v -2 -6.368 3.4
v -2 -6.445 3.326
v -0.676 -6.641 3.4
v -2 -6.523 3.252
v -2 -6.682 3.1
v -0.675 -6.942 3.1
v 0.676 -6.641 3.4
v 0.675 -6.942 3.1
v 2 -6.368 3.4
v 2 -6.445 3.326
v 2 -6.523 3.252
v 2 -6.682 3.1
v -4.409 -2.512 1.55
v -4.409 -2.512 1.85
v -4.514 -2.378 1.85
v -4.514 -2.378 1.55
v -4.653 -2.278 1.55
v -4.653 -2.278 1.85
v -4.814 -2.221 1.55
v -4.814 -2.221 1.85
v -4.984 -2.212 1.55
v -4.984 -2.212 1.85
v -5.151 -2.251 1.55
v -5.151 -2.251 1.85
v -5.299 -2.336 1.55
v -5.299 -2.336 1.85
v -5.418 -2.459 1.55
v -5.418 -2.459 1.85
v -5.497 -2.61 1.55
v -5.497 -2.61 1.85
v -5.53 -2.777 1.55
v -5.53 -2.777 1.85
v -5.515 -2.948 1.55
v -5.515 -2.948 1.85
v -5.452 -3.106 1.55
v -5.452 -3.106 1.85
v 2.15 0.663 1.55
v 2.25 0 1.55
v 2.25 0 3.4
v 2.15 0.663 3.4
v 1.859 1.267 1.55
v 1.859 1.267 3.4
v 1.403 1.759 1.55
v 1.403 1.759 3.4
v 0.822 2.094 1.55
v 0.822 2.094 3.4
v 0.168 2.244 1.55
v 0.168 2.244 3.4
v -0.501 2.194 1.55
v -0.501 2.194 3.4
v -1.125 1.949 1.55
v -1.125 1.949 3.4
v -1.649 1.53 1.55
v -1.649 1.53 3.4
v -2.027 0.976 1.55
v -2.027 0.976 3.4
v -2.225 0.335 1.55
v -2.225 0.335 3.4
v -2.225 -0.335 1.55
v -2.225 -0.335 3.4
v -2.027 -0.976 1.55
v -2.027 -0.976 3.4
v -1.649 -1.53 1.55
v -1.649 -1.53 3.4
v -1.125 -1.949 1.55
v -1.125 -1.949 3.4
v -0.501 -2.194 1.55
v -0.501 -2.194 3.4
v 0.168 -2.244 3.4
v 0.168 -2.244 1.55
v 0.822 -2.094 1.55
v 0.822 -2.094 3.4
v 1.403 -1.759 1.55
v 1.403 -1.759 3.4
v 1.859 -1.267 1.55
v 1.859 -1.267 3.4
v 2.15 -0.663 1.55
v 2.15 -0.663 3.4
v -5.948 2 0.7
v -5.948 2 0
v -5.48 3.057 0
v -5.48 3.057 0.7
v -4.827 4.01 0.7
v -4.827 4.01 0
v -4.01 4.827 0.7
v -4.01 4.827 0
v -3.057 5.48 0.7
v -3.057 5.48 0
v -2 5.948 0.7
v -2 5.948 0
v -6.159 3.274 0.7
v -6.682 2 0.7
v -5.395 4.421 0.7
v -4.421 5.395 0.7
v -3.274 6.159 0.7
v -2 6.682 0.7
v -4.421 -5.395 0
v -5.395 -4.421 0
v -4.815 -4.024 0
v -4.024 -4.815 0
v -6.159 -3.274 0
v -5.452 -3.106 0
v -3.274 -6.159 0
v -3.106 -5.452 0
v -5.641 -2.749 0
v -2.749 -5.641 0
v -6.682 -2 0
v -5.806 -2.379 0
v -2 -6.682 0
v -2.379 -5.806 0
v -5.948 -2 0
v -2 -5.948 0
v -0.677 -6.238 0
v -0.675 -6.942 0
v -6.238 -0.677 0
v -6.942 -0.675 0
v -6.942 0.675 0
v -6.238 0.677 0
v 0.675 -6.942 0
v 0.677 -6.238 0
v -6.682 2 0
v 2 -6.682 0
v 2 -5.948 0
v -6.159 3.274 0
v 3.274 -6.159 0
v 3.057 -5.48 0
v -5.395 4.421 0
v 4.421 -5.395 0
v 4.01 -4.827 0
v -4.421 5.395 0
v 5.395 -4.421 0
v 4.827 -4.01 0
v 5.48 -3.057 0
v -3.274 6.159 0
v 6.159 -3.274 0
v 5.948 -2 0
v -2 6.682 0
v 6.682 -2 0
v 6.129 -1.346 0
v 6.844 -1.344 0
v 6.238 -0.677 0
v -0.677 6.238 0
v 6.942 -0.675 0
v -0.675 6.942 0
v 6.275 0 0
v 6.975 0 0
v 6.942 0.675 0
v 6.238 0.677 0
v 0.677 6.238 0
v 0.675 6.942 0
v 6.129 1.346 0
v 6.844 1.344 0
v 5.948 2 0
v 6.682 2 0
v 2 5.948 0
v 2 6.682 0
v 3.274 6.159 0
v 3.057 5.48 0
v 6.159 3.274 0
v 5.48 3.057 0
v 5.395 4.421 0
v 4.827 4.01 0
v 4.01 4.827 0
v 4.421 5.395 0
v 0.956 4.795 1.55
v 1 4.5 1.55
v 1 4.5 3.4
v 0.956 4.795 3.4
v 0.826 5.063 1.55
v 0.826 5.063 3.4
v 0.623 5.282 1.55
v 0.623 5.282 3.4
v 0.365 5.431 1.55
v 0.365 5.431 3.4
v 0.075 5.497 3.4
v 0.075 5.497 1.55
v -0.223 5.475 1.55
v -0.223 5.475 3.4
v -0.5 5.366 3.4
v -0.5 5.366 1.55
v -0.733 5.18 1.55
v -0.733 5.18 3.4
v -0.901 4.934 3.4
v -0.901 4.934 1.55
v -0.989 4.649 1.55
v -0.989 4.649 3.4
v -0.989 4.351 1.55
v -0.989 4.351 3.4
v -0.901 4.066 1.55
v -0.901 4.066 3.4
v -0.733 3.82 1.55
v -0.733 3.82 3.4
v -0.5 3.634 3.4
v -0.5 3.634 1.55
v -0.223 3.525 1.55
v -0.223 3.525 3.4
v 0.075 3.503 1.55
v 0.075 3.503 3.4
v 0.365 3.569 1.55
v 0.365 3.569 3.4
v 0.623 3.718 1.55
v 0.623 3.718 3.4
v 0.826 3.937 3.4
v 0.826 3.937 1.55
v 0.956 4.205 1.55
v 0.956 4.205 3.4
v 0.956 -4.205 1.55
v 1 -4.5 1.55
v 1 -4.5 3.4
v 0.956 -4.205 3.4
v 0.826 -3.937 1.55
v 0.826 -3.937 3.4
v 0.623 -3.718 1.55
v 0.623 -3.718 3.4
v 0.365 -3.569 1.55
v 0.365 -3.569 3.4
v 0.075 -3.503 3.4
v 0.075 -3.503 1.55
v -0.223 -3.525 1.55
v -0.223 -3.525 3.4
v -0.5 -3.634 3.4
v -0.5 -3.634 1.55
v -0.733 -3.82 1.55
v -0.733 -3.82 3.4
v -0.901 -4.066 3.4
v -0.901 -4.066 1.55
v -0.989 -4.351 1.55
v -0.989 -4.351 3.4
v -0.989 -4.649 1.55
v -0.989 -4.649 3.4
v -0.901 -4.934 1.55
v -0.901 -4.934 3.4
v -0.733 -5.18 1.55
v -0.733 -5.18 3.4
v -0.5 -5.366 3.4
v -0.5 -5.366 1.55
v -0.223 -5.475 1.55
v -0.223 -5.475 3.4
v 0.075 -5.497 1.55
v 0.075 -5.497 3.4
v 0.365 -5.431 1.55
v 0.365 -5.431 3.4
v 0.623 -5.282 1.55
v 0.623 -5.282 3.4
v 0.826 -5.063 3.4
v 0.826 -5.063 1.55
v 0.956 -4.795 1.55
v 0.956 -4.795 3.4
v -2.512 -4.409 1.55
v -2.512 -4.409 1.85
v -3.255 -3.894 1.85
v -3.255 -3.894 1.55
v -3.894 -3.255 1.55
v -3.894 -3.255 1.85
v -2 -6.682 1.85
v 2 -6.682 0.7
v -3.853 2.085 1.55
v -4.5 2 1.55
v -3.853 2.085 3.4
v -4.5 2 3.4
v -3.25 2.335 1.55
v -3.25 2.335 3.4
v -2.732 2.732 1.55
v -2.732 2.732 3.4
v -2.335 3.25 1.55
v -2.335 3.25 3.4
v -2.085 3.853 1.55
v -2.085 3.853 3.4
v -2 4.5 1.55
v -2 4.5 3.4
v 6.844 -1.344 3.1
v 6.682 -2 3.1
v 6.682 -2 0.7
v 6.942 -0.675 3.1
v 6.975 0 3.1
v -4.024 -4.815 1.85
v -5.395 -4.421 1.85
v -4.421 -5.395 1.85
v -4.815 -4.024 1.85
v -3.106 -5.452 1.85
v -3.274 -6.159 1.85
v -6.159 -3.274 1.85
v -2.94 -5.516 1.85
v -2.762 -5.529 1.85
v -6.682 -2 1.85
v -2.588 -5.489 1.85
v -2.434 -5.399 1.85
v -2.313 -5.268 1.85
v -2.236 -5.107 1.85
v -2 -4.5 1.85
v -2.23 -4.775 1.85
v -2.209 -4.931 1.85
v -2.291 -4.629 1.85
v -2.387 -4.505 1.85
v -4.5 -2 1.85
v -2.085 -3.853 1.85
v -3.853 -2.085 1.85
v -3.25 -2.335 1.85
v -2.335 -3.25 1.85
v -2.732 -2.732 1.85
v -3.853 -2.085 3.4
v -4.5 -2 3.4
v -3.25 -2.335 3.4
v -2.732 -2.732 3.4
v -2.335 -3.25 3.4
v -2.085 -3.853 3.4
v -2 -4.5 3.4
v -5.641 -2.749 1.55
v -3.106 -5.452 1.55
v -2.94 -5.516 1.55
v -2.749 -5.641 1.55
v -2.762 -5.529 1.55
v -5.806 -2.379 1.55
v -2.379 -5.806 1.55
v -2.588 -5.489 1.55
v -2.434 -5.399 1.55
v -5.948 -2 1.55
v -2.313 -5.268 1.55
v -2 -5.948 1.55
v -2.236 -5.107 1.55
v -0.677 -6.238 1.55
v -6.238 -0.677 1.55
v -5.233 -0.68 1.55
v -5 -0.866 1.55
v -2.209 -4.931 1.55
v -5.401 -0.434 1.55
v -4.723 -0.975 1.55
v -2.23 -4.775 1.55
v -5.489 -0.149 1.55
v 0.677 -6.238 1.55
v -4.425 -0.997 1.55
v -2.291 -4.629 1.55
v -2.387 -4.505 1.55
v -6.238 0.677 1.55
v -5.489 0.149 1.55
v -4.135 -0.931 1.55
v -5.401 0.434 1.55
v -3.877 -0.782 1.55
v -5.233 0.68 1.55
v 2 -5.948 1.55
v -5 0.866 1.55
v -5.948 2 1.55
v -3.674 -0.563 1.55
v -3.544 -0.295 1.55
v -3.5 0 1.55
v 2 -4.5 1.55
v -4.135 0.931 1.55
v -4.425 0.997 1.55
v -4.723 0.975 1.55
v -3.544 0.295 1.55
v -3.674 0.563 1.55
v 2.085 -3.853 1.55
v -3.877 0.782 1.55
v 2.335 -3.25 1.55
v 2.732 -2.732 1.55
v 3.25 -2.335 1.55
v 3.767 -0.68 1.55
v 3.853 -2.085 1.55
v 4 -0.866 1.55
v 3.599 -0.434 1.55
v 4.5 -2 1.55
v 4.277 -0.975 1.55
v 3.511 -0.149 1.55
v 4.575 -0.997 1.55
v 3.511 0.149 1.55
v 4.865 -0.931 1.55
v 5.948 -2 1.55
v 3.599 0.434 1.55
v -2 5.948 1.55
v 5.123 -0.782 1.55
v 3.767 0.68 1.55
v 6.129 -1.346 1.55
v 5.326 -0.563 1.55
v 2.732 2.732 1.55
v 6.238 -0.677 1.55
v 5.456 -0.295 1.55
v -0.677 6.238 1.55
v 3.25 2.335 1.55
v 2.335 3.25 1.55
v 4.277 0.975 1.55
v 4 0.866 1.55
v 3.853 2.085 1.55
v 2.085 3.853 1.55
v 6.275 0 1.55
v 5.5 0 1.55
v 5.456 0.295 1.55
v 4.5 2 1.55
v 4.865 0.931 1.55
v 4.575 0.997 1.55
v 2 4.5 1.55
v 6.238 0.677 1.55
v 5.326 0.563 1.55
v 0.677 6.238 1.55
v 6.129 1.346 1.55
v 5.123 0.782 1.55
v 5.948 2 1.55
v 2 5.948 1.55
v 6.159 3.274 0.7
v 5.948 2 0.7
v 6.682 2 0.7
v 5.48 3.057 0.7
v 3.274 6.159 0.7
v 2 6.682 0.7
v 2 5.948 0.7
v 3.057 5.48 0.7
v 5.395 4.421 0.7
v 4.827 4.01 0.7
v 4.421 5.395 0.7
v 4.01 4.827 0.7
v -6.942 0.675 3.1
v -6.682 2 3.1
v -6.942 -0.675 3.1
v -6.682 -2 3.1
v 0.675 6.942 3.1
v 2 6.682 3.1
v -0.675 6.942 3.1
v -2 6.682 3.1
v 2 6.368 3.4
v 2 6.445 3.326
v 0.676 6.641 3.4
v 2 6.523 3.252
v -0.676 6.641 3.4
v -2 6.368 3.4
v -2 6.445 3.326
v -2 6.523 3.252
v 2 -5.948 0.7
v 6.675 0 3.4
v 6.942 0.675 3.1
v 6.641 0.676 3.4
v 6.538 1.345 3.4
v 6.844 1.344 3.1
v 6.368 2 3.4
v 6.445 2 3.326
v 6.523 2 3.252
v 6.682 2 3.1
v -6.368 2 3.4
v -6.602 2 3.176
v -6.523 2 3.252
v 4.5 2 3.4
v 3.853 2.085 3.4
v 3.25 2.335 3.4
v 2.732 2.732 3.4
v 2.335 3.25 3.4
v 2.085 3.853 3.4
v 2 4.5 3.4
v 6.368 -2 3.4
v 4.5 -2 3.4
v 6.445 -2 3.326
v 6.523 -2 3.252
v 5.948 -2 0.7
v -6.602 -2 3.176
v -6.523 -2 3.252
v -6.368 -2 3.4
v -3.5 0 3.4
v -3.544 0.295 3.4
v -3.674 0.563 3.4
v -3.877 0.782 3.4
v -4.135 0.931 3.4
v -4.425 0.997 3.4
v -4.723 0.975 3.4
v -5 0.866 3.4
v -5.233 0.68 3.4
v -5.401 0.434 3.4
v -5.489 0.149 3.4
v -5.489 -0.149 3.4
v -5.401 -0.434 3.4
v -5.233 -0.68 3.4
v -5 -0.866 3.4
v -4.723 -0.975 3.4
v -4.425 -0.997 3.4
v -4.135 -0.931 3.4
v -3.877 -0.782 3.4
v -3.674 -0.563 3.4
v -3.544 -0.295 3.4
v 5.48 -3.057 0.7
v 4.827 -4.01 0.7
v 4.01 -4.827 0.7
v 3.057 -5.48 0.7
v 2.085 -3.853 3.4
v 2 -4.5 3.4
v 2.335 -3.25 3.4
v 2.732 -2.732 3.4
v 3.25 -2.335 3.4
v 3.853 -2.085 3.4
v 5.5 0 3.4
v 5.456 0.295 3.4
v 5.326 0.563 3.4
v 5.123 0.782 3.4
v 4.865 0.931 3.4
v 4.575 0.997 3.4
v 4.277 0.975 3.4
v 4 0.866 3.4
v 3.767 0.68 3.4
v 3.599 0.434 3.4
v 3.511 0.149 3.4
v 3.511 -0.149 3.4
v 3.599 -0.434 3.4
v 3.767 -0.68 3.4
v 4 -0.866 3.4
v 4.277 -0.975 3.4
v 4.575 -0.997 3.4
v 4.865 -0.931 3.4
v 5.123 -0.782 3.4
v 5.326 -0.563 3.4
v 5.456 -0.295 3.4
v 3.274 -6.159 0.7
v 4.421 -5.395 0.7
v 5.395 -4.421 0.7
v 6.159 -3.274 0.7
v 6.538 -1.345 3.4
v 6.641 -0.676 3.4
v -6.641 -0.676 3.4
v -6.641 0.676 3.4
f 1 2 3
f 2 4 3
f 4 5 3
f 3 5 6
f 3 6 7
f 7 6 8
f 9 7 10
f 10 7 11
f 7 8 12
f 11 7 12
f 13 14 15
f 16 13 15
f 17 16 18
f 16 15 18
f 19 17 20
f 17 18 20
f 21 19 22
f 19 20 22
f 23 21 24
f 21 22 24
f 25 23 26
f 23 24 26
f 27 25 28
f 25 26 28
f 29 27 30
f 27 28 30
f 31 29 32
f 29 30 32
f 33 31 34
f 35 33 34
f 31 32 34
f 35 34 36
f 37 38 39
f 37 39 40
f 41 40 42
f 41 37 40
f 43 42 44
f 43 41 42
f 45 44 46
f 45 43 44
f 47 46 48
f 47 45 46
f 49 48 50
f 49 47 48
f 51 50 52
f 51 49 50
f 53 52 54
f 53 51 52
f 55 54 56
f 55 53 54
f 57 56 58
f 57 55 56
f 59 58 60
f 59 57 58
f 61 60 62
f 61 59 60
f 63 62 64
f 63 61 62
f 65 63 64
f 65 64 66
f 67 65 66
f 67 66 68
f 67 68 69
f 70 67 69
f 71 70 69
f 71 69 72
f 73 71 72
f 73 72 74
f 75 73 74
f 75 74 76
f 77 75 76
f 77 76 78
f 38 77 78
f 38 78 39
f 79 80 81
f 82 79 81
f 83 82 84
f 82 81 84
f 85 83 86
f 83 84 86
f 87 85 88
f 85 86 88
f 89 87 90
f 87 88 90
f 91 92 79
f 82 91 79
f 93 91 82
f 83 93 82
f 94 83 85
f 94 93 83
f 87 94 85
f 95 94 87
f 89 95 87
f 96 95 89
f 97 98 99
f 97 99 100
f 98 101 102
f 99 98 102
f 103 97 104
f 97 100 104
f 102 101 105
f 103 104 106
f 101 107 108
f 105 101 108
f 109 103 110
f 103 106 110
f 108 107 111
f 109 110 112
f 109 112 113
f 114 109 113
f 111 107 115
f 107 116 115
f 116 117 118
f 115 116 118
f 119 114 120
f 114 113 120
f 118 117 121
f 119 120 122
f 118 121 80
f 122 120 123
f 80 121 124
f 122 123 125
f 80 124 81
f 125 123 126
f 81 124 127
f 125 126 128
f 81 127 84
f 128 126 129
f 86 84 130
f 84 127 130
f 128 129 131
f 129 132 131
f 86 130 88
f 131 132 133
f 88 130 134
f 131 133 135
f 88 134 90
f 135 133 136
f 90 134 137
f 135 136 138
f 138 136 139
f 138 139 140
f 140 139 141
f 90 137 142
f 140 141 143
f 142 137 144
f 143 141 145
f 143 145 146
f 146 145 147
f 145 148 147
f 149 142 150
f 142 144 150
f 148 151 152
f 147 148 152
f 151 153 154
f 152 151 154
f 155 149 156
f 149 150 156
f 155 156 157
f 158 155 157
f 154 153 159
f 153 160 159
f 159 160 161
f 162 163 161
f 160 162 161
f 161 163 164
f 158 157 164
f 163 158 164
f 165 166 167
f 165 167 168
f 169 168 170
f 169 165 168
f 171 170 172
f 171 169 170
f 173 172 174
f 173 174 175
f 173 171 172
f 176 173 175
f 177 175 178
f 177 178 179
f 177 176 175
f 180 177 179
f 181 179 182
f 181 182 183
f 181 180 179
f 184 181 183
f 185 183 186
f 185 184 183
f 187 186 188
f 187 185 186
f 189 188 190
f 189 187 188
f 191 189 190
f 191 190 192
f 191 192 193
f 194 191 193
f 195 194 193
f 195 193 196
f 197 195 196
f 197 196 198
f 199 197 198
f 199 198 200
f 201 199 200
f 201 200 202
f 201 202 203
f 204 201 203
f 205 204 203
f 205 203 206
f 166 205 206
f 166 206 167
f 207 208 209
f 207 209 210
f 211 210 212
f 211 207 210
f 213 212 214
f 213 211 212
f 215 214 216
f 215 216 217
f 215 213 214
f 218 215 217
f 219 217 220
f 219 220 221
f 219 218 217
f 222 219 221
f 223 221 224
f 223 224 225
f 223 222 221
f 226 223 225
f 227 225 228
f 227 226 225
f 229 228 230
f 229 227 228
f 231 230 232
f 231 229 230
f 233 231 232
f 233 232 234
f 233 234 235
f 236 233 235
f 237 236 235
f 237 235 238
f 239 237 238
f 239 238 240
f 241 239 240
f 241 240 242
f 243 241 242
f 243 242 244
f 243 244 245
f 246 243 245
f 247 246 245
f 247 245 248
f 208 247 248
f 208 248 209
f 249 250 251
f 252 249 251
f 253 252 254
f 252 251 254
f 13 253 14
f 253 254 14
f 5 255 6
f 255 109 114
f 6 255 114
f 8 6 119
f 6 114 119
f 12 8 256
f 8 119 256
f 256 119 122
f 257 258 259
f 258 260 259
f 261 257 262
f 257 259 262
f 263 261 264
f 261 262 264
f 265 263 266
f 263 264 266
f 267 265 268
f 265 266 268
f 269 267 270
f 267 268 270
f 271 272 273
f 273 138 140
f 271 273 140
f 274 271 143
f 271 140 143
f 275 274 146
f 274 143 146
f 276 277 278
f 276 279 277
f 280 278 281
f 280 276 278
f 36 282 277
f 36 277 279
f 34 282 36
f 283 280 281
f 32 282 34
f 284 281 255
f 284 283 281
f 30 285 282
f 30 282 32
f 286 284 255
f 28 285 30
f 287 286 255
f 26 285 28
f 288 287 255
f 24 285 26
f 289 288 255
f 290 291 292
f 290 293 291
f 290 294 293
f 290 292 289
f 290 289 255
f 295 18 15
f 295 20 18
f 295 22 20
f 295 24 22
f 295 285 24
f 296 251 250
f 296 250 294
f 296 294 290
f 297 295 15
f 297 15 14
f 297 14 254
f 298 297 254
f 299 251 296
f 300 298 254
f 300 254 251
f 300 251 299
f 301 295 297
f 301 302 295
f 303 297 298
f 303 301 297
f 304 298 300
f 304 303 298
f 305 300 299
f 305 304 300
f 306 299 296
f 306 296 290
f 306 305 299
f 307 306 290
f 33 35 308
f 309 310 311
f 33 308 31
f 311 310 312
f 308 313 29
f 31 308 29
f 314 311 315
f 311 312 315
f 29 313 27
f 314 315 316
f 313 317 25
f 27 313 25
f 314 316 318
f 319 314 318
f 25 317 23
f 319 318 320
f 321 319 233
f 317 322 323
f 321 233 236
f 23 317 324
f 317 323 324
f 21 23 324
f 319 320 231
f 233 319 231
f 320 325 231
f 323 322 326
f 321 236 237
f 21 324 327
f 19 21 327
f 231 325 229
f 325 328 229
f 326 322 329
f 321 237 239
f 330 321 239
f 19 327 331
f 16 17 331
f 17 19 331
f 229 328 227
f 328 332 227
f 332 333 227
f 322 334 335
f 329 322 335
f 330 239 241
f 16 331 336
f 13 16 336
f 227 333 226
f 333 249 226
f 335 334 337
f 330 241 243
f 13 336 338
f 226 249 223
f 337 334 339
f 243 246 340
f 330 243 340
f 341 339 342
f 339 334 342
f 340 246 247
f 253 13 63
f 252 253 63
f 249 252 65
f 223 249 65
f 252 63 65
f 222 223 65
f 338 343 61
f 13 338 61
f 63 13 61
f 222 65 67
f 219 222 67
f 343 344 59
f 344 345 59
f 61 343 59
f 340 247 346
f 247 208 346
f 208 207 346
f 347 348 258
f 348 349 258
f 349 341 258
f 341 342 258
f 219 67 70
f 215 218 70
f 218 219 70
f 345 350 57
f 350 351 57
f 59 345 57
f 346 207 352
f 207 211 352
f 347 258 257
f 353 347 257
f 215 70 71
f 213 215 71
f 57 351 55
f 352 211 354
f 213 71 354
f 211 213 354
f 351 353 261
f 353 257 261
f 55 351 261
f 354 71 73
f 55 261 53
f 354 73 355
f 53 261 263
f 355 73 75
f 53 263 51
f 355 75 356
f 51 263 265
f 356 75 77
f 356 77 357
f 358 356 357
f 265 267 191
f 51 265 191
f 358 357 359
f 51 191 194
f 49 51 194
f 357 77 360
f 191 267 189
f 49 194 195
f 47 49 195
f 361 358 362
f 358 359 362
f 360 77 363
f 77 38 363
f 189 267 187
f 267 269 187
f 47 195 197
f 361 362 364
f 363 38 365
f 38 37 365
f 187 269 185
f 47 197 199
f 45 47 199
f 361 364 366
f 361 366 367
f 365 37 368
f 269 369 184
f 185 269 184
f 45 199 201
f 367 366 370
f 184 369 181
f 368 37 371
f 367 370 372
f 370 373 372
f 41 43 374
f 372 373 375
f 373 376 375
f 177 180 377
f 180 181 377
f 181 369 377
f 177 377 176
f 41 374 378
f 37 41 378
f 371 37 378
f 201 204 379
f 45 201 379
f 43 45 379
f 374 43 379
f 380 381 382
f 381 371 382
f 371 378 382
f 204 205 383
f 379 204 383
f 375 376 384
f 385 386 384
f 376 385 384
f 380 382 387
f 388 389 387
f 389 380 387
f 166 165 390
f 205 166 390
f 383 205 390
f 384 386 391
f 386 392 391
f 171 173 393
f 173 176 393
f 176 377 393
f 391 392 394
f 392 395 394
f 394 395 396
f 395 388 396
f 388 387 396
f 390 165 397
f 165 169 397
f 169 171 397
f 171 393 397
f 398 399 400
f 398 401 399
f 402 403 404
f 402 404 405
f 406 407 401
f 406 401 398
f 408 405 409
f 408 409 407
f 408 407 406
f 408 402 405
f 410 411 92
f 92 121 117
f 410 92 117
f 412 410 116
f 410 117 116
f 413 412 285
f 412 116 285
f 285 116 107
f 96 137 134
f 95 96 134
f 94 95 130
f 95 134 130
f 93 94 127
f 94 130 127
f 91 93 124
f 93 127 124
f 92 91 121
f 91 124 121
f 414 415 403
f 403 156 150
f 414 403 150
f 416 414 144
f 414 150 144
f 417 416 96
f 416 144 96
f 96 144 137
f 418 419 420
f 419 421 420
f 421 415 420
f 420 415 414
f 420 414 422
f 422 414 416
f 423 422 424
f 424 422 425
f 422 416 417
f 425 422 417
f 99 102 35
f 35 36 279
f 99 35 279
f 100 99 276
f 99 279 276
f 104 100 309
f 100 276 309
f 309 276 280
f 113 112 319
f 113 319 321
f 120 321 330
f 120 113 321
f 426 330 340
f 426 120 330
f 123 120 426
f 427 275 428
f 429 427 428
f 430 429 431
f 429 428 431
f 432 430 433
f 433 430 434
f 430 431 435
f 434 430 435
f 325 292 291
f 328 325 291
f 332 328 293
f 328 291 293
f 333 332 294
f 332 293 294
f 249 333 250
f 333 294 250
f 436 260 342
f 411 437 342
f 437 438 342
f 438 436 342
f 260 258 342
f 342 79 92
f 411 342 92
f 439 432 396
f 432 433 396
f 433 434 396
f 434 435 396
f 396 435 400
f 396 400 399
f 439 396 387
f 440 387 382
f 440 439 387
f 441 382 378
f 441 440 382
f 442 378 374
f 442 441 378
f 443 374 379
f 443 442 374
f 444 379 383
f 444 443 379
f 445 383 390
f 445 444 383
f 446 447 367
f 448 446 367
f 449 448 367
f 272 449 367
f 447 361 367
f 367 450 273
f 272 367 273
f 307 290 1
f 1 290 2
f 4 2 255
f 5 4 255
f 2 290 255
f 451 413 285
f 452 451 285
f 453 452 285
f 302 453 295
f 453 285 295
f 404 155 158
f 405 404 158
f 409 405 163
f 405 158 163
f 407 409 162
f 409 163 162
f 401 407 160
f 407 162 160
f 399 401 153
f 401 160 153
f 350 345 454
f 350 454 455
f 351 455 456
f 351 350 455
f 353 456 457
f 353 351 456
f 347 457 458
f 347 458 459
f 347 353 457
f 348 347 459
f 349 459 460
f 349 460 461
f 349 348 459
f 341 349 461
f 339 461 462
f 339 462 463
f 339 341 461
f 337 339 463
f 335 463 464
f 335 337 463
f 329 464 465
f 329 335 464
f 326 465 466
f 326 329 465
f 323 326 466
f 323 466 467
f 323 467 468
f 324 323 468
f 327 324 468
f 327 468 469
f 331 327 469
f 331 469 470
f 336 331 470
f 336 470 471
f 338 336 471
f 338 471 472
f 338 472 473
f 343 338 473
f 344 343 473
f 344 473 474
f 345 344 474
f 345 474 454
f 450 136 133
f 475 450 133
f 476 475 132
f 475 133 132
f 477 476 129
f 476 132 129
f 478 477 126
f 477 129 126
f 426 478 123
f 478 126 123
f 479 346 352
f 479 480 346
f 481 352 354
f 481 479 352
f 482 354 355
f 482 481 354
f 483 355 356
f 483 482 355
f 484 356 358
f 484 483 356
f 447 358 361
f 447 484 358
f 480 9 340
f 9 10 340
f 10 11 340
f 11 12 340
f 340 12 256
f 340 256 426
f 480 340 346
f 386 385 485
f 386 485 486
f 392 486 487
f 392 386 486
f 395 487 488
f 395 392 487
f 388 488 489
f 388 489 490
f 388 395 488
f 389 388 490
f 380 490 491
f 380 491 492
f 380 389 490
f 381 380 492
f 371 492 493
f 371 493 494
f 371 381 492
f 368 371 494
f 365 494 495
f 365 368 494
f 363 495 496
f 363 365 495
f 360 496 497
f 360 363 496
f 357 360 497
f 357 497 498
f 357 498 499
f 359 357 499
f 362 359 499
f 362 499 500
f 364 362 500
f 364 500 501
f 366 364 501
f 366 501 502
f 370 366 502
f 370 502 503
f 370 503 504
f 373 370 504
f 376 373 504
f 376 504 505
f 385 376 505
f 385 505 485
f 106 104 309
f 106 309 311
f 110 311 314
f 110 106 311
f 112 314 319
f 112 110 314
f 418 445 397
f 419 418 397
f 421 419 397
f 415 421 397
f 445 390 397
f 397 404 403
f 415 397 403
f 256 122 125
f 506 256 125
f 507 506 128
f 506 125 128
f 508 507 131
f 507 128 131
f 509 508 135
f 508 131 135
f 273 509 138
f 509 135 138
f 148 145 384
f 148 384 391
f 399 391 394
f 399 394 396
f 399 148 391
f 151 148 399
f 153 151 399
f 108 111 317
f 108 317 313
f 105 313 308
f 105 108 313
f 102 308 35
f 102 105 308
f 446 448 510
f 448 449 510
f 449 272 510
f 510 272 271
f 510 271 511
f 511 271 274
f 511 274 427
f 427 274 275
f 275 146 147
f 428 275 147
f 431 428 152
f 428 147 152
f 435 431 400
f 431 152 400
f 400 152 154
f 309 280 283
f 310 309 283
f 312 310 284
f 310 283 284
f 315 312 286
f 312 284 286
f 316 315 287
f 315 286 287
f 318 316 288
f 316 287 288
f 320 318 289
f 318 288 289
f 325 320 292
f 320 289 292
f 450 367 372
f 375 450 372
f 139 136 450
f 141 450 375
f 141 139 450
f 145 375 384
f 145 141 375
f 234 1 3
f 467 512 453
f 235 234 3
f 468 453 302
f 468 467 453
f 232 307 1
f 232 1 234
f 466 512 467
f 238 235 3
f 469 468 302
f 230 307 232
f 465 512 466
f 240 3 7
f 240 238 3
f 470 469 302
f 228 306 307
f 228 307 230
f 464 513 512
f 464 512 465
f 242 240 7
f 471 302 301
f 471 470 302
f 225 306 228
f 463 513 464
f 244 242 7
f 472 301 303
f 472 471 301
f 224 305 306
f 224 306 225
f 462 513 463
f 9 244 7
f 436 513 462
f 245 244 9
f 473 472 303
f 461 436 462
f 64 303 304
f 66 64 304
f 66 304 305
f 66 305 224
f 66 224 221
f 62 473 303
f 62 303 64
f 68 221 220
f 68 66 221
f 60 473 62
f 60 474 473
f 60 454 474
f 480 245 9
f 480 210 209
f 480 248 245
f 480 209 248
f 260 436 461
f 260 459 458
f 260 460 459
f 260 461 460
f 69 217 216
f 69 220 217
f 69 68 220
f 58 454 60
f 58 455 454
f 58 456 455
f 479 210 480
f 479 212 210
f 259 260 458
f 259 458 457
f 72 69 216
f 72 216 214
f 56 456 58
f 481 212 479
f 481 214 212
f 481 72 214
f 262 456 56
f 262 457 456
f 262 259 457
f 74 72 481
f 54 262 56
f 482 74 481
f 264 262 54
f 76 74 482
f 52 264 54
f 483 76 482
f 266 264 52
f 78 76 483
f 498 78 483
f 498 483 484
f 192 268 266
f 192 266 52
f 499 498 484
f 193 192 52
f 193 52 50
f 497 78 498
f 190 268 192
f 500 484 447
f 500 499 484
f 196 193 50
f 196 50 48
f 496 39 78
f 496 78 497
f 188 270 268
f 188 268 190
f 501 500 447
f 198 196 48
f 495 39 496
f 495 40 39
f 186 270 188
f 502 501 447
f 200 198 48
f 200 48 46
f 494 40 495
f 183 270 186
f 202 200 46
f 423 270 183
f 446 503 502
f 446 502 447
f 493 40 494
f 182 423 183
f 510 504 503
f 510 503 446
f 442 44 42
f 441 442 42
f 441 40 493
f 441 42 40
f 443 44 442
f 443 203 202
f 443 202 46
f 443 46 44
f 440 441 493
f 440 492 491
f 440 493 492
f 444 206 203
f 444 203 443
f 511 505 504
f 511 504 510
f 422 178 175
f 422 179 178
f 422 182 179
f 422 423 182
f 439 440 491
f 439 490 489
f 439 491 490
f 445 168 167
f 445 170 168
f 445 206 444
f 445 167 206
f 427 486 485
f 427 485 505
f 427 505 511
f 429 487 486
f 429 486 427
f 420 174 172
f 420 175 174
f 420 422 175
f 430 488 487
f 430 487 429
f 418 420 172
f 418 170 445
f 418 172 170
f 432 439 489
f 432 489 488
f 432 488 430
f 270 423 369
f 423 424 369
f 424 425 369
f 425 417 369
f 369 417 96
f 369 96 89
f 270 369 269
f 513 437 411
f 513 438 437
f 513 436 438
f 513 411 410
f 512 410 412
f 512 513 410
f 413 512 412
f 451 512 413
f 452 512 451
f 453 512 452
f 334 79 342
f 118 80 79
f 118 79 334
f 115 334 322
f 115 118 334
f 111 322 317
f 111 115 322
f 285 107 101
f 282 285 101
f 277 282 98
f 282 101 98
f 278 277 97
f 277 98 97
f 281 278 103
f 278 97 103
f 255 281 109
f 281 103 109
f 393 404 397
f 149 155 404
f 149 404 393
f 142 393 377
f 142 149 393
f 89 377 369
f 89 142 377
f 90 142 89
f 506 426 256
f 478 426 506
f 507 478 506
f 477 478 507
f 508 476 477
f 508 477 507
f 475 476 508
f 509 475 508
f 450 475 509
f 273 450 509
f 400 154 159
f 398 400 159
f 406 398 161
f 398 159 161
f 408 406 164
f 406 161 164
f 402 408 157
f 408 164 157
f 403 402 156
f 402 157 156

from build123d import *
from build123d import SkipClean  # not in build123d's __all__

# Parameters (mm, degrees)
F0_R     = 1
F0_R_2   = 2.25
F1_DEPTH = 3.4
F2_DEPTH = 0.7
F3_DEPTH = 1.85
F4_DEPTH = 1.55
F5_R     = 2.5
F6_SIZE  = 0.3
F8_DEPTH = 1.851


# Not quite as in the source:
# - after a boolean that leaves OpenCascade's solid faulty, fix() repairs it


with BuildPart() as f1:
    # F0 (on Top) → F1 (new body)
    with BuildSketch(Plane.XY):
        with BuildLine():
            Line((2, 5.9477411679), (2, 6.6821123157))
            ThreePointArc((2, 6.6821123157), (0, 6.975), (-2, 6.6821123157))
            Line((-2, 6.6821123157), (-2, 5.9477411679))
            ThreePointArc((-2, 5.9477411679), (0, 6.275), (2, 5.9477411679))
        make_face()
        with BuildLine():
            ThreePointArc((6.275, 0), (6.1926448642, 1.013298863), (5.9477411679, 2))
            Line((5.9477411679, 2), (2, 2))
            Line((2, 2), (2, 5.9477411679))
            ThreePointArc((2, 5.9477411679), (0, 6.275), (-2, 5.9477411679))
            Line((-2, 5.9477411679), (-2, 2))
            Line((-2, 2), (-5.9477411679, 2))
            ThreePointArc((-5.9477411679, 2), (-6.275, 0), (-5.9477411679, -2))
            Line((-5.9477411679, -2), (-2, -2))
            Line((-2, -2), (-2, -5.9477411679))
            ThreePointArc((-2, -5.9477411679), (0, -6.275), (2, -5.9477411679))
            Line((2, -5.9477411679), (2, -2))
            Line((2, -2), (5.9477411679, -2))
            ThreePointArc((5.9477411679, -2), (6.1926448642, -1.013298863), (6.275, 0))
        make_face()
        with Locations((0, -4.5)):
            Circle(F0_R, mode=Mode.SUBTRACT)
        with Locations((-4.5, 0)):
            Circle(F0_R, mode=Mode.SUBTRACT)
        Circle(F0_R_2, mode=Mode.SUBTRACT)
        with Locations((4.5, 0)):
            Circle(F0_R, mode=Mode.SUBTRACT)
        with Locations((0, 4.5)):
            Circle(F0_R, mode=Mode.SUBTRACT)
        with BuildLine():
            ThreePointArc((6.6821123157, -2), (6.9013896572, -1.0106660175), (6.975, 0))
            ThreePointArc((6.975, 0), (6.9013896572, 1.0106660175), (6.6821123157, 2))
            Line((6.6821123157, 2), (5.9477411679, 2))
            ThreePointArc((5.9477411679, 2), (6.1926448642, 1.013298863), (6.275, 0))
            ThreePointArc((6.275, 0), (6.1926448642, -1.013298863), (5.9477411679, -2))
            Line((5.9477411679, -2), (6.6821123157, -2))
        make_face()
        with BuildLine():
            Line((-5.9477411679, 2), (-6.6821123157, 2))
            ThreePointArc((-6.6821123157, 2), (-6.975, 0), (-6.6821123157, -2))
            Line((-6.6821123157, -2), (-5.9477411679, -2))
            ThreePointArc((-5.9477411679, -2), (-6.275, 0), (-5.9477411679, 2))
        make_face()
        with BuildLine():
            ThreePointArc((-2, -6.6821123157), (0, -6.975), (2, -6.6821123157))
            Line((2, -6.6821123157), (2, -5.9477411679))
            ThreePointArc((2, -5.9477411679), (0, -6.275), (-2, -5.9477411679))
            Line((-2, -5.9477411679), (-2, -6.6821123157))
        make_face()
    extrude(amount=F1_DEPTH)

    # F0 (on Top) → F2 (join)
    with BuildSketch(Plane.XY):
        with BuildLine():
            Line((-2, 5.9477411679), (-2, 6.6821123157))
            ThreePointArc((-2, 6.6821123157), (-4.9320697988, 4.9320697988), (-6.6821123157, 2))
            Line((-6.6821123157, 2), (-5.9477411679, 2))
            ThreePointArc((-5.9477411679, 2), (-4.4370950519, 4.4370950519), (-2, 5.9477411679))
        make_face()
        with BuildLine():
            Line((5.9477411679, 2), (6.6821123157, 2))
            ThreePointArc((6.6821123157, 2), (4.9320697988, 4.9320697988), (2, 6.6821123157))
            Line((2, 6.6821123157), (2, 5.9477411679))
            ThreePointArc((2, 5.9477411679), (4.4370950519, 4.4370950519), (5.9477411679, 2))
        make_face()
        with BuildLine():
            ThreePointArc((2, -6.6821123157), (4.9320697988, -4.9320697988), (6.6821123157, -2))
            Line((6.6821123157, -2), (5.9477411679, -2))
            ThreePointArc((5.9477411679, -2), (4.4370950519, -4.4370950519), (2, -5.9477411679))
            Line((2, -5.9477411679), (2, -6.6821123157))
        make_face()
    extrude(amount=F2_DEPTH)

    # F0 (on Top) → F3 (join, through all)
    with BuildSketch(Plane.XY):
        with BuildLine():
            ThreePointArc((-5.9477411679, -2), (-4.4370950519, -4.4370950519), (-2, -5.9477411679))
            Line((-2, -5.9477411679), (-2, -2))
            Line((-2, -2), (-5.9477411679, -2))
        make_face()
        with BuildLine():
            ThreePointArc((-6.6821123157, -2), (-4.9320697988, -4.9320697988), (-2, -6.6821123157))
            Line((-2, -6.6821123157), (-2, -5.9477411679))
            ThreePointArc((-2, -5.9477411679), (-4.4370950519, -4.4370950519), (-5.9477411679, -2))
            Line((-5.9477411679, -2), (-6.6821123157, -2))
        make_face()
    extrude(amount=F3_DEPTH)

    # F0 (on Top) → F4 (cut, through all)
    with BuildSketch(Plane.XY):
        with BuildLine():
            ThreePointArc((6.275, 0), (6.1926448642, 1.013298863), (5.9477411679, 2))
            Line((5.9477411679, 2), (2, 2))
            Line((2, 2), (2, 5.9477411679))
            ThreePointArc((2, 5.9477411679), (0, 6.275), (-2, 5.9477411679))
            Line((-2, 5.9477411679), (-2, 2))
            Line((-2, 2), (-5.9477411679, 2))
            ThreePointArc((-5.9477411679, 2), (-6.275, 0), (-5.9477411679, -2))
            Line((-5.9477411679, -2), (-2, -2))
            Line((-2, -2), (-2, -5.9477411679))
            ThreePointArc((-2, -5.9477411679), (0, -6.275), (2, -5.9477411679))
            Line((2, -5.9477411679), (2, -2))
            Line((2, -2), (5.9477411679, -2))
            ThreePointArc((5.9477411679, -2), (6.1926448642, -1.013298863), (6.275, 0))
        make_face()
        with Locations((0, -4.5)):
            Circle(F0_R, mode=Mode.SUBTRACT)
        with Locations((-4.5, 0)):
            Circle(F0_R, mode=Mode.SUBTRACT)
        Circle(F0_R_2, mode=Mode.SUBTRACT)
        with Locations((4.5, 0)):
            Circle(F0_R, mode=Mode.SUBTRACT)
        with Locations((0, 4.5)):
            Circle(F0_R, mode=Mode.SUBTRACT)
        with BuildLine():
            ThreePointArc((-5.9477411679, -2), (-4.4370950519, -4.4370950519), (-2, -5.9477411679))
            Line((-2, -5.9477411679), (-2, -2))
            Line((-2, -2), (-5.9477411679, -2))
        make_face()
    with SkipClean():  # cleaning this boolean's faces spoils the solid; the shape is the same uncleaned
        extrude(amount=F4_DEPTH, mode=Mode.SUBTRACT)

    # F5
    f5_edges = [f1.edges().sort_by_distance(p)[0] for p in [
        (-2, 2, 2.475),
        (-2, -2, 2.625),
        (2, -2, 2.475),
        (2, 2, 2.475),
    ]]
    fillet(f5_edges, radius=F5_R)

    # F6
    f6_edges = [f1.edges().sort_by_distance(p)[0] for p in [
        (0, -6.975, 3.4),
        (6.975, 0, 3.4),
        (0, 6.975, 3.4),
        (-6.975, 0, 3.4),
    ]]
    chamfer(f6_edges, length=F6_SIZE)

    # F7 (on face) → F8 (cut, through all)
    with BuildSketch(Plane.XY.offset(1.85)):
        with BuildLine():
            ThreePointArc((-5.4520938065, -3.106492898), (-4.777137974, -3.3894531711), (-4.330778064, -2.8094577205))
            ThreePointArc((-4.330778064, -2.8094577205), (-4.3507826134, -2.6558176305), (-4.4094623216, -2.512422543))
            ThreePointArc((-4.4094623216, -2.512422543), (-5.2278132415, -2.288141978), (-5.4520938065, -3.106492898))
        make_face()
        with BuildLine():
            ThreePointArc((-4.4094623216, -2.512422543), (-4.3507826134, -2.6558176305), (-4.330778064, -2.8094577205))
            ThreePointArc((-4.330778064, -2.8094577205), (-4.777137974, -3.3894531711), (-5.4520938065, -3.106492898))
            ThreePointArc((-5.4520938065, -3.106492898), (-4.4370950519, -4.4370950519), (-3.106492898, -5.4520938065))
            ThreePointArc((-3.106492898, -5.4520938065), (-3.3307734629, -4.6337428865), (-2.512422543, -4.4094623216))
            ThreePointArc((-2.512422543, -4.4094623216), (-3.5885669145, -3.5885669145), (-4.4094623216, -2.512422543))
        make_face()
        with BuildLine():
            ThreePointArc((-2.2094577205, -4.930778064), (-2.2906990548, -4.6292992974), (-2.512422543, -4.4094623216))
            ThreePointArc((-2.512422543, -4.4094623216), (-3.3307734629, -4.6337428865), (-3.106492898, -5.4520938065))
            ThreePointArc((-3.106492898, -5.4520938065), (-2.5079789538, -5.4495367298), (-2.2094577205, -4.930778064))
        make_face()
    extrude(amount=-F8_DEPTH, mode=Mode.SUBTRACT)

    add(f1.part.fix(), mode=Mode.REPLACE)


solid = f1.part
